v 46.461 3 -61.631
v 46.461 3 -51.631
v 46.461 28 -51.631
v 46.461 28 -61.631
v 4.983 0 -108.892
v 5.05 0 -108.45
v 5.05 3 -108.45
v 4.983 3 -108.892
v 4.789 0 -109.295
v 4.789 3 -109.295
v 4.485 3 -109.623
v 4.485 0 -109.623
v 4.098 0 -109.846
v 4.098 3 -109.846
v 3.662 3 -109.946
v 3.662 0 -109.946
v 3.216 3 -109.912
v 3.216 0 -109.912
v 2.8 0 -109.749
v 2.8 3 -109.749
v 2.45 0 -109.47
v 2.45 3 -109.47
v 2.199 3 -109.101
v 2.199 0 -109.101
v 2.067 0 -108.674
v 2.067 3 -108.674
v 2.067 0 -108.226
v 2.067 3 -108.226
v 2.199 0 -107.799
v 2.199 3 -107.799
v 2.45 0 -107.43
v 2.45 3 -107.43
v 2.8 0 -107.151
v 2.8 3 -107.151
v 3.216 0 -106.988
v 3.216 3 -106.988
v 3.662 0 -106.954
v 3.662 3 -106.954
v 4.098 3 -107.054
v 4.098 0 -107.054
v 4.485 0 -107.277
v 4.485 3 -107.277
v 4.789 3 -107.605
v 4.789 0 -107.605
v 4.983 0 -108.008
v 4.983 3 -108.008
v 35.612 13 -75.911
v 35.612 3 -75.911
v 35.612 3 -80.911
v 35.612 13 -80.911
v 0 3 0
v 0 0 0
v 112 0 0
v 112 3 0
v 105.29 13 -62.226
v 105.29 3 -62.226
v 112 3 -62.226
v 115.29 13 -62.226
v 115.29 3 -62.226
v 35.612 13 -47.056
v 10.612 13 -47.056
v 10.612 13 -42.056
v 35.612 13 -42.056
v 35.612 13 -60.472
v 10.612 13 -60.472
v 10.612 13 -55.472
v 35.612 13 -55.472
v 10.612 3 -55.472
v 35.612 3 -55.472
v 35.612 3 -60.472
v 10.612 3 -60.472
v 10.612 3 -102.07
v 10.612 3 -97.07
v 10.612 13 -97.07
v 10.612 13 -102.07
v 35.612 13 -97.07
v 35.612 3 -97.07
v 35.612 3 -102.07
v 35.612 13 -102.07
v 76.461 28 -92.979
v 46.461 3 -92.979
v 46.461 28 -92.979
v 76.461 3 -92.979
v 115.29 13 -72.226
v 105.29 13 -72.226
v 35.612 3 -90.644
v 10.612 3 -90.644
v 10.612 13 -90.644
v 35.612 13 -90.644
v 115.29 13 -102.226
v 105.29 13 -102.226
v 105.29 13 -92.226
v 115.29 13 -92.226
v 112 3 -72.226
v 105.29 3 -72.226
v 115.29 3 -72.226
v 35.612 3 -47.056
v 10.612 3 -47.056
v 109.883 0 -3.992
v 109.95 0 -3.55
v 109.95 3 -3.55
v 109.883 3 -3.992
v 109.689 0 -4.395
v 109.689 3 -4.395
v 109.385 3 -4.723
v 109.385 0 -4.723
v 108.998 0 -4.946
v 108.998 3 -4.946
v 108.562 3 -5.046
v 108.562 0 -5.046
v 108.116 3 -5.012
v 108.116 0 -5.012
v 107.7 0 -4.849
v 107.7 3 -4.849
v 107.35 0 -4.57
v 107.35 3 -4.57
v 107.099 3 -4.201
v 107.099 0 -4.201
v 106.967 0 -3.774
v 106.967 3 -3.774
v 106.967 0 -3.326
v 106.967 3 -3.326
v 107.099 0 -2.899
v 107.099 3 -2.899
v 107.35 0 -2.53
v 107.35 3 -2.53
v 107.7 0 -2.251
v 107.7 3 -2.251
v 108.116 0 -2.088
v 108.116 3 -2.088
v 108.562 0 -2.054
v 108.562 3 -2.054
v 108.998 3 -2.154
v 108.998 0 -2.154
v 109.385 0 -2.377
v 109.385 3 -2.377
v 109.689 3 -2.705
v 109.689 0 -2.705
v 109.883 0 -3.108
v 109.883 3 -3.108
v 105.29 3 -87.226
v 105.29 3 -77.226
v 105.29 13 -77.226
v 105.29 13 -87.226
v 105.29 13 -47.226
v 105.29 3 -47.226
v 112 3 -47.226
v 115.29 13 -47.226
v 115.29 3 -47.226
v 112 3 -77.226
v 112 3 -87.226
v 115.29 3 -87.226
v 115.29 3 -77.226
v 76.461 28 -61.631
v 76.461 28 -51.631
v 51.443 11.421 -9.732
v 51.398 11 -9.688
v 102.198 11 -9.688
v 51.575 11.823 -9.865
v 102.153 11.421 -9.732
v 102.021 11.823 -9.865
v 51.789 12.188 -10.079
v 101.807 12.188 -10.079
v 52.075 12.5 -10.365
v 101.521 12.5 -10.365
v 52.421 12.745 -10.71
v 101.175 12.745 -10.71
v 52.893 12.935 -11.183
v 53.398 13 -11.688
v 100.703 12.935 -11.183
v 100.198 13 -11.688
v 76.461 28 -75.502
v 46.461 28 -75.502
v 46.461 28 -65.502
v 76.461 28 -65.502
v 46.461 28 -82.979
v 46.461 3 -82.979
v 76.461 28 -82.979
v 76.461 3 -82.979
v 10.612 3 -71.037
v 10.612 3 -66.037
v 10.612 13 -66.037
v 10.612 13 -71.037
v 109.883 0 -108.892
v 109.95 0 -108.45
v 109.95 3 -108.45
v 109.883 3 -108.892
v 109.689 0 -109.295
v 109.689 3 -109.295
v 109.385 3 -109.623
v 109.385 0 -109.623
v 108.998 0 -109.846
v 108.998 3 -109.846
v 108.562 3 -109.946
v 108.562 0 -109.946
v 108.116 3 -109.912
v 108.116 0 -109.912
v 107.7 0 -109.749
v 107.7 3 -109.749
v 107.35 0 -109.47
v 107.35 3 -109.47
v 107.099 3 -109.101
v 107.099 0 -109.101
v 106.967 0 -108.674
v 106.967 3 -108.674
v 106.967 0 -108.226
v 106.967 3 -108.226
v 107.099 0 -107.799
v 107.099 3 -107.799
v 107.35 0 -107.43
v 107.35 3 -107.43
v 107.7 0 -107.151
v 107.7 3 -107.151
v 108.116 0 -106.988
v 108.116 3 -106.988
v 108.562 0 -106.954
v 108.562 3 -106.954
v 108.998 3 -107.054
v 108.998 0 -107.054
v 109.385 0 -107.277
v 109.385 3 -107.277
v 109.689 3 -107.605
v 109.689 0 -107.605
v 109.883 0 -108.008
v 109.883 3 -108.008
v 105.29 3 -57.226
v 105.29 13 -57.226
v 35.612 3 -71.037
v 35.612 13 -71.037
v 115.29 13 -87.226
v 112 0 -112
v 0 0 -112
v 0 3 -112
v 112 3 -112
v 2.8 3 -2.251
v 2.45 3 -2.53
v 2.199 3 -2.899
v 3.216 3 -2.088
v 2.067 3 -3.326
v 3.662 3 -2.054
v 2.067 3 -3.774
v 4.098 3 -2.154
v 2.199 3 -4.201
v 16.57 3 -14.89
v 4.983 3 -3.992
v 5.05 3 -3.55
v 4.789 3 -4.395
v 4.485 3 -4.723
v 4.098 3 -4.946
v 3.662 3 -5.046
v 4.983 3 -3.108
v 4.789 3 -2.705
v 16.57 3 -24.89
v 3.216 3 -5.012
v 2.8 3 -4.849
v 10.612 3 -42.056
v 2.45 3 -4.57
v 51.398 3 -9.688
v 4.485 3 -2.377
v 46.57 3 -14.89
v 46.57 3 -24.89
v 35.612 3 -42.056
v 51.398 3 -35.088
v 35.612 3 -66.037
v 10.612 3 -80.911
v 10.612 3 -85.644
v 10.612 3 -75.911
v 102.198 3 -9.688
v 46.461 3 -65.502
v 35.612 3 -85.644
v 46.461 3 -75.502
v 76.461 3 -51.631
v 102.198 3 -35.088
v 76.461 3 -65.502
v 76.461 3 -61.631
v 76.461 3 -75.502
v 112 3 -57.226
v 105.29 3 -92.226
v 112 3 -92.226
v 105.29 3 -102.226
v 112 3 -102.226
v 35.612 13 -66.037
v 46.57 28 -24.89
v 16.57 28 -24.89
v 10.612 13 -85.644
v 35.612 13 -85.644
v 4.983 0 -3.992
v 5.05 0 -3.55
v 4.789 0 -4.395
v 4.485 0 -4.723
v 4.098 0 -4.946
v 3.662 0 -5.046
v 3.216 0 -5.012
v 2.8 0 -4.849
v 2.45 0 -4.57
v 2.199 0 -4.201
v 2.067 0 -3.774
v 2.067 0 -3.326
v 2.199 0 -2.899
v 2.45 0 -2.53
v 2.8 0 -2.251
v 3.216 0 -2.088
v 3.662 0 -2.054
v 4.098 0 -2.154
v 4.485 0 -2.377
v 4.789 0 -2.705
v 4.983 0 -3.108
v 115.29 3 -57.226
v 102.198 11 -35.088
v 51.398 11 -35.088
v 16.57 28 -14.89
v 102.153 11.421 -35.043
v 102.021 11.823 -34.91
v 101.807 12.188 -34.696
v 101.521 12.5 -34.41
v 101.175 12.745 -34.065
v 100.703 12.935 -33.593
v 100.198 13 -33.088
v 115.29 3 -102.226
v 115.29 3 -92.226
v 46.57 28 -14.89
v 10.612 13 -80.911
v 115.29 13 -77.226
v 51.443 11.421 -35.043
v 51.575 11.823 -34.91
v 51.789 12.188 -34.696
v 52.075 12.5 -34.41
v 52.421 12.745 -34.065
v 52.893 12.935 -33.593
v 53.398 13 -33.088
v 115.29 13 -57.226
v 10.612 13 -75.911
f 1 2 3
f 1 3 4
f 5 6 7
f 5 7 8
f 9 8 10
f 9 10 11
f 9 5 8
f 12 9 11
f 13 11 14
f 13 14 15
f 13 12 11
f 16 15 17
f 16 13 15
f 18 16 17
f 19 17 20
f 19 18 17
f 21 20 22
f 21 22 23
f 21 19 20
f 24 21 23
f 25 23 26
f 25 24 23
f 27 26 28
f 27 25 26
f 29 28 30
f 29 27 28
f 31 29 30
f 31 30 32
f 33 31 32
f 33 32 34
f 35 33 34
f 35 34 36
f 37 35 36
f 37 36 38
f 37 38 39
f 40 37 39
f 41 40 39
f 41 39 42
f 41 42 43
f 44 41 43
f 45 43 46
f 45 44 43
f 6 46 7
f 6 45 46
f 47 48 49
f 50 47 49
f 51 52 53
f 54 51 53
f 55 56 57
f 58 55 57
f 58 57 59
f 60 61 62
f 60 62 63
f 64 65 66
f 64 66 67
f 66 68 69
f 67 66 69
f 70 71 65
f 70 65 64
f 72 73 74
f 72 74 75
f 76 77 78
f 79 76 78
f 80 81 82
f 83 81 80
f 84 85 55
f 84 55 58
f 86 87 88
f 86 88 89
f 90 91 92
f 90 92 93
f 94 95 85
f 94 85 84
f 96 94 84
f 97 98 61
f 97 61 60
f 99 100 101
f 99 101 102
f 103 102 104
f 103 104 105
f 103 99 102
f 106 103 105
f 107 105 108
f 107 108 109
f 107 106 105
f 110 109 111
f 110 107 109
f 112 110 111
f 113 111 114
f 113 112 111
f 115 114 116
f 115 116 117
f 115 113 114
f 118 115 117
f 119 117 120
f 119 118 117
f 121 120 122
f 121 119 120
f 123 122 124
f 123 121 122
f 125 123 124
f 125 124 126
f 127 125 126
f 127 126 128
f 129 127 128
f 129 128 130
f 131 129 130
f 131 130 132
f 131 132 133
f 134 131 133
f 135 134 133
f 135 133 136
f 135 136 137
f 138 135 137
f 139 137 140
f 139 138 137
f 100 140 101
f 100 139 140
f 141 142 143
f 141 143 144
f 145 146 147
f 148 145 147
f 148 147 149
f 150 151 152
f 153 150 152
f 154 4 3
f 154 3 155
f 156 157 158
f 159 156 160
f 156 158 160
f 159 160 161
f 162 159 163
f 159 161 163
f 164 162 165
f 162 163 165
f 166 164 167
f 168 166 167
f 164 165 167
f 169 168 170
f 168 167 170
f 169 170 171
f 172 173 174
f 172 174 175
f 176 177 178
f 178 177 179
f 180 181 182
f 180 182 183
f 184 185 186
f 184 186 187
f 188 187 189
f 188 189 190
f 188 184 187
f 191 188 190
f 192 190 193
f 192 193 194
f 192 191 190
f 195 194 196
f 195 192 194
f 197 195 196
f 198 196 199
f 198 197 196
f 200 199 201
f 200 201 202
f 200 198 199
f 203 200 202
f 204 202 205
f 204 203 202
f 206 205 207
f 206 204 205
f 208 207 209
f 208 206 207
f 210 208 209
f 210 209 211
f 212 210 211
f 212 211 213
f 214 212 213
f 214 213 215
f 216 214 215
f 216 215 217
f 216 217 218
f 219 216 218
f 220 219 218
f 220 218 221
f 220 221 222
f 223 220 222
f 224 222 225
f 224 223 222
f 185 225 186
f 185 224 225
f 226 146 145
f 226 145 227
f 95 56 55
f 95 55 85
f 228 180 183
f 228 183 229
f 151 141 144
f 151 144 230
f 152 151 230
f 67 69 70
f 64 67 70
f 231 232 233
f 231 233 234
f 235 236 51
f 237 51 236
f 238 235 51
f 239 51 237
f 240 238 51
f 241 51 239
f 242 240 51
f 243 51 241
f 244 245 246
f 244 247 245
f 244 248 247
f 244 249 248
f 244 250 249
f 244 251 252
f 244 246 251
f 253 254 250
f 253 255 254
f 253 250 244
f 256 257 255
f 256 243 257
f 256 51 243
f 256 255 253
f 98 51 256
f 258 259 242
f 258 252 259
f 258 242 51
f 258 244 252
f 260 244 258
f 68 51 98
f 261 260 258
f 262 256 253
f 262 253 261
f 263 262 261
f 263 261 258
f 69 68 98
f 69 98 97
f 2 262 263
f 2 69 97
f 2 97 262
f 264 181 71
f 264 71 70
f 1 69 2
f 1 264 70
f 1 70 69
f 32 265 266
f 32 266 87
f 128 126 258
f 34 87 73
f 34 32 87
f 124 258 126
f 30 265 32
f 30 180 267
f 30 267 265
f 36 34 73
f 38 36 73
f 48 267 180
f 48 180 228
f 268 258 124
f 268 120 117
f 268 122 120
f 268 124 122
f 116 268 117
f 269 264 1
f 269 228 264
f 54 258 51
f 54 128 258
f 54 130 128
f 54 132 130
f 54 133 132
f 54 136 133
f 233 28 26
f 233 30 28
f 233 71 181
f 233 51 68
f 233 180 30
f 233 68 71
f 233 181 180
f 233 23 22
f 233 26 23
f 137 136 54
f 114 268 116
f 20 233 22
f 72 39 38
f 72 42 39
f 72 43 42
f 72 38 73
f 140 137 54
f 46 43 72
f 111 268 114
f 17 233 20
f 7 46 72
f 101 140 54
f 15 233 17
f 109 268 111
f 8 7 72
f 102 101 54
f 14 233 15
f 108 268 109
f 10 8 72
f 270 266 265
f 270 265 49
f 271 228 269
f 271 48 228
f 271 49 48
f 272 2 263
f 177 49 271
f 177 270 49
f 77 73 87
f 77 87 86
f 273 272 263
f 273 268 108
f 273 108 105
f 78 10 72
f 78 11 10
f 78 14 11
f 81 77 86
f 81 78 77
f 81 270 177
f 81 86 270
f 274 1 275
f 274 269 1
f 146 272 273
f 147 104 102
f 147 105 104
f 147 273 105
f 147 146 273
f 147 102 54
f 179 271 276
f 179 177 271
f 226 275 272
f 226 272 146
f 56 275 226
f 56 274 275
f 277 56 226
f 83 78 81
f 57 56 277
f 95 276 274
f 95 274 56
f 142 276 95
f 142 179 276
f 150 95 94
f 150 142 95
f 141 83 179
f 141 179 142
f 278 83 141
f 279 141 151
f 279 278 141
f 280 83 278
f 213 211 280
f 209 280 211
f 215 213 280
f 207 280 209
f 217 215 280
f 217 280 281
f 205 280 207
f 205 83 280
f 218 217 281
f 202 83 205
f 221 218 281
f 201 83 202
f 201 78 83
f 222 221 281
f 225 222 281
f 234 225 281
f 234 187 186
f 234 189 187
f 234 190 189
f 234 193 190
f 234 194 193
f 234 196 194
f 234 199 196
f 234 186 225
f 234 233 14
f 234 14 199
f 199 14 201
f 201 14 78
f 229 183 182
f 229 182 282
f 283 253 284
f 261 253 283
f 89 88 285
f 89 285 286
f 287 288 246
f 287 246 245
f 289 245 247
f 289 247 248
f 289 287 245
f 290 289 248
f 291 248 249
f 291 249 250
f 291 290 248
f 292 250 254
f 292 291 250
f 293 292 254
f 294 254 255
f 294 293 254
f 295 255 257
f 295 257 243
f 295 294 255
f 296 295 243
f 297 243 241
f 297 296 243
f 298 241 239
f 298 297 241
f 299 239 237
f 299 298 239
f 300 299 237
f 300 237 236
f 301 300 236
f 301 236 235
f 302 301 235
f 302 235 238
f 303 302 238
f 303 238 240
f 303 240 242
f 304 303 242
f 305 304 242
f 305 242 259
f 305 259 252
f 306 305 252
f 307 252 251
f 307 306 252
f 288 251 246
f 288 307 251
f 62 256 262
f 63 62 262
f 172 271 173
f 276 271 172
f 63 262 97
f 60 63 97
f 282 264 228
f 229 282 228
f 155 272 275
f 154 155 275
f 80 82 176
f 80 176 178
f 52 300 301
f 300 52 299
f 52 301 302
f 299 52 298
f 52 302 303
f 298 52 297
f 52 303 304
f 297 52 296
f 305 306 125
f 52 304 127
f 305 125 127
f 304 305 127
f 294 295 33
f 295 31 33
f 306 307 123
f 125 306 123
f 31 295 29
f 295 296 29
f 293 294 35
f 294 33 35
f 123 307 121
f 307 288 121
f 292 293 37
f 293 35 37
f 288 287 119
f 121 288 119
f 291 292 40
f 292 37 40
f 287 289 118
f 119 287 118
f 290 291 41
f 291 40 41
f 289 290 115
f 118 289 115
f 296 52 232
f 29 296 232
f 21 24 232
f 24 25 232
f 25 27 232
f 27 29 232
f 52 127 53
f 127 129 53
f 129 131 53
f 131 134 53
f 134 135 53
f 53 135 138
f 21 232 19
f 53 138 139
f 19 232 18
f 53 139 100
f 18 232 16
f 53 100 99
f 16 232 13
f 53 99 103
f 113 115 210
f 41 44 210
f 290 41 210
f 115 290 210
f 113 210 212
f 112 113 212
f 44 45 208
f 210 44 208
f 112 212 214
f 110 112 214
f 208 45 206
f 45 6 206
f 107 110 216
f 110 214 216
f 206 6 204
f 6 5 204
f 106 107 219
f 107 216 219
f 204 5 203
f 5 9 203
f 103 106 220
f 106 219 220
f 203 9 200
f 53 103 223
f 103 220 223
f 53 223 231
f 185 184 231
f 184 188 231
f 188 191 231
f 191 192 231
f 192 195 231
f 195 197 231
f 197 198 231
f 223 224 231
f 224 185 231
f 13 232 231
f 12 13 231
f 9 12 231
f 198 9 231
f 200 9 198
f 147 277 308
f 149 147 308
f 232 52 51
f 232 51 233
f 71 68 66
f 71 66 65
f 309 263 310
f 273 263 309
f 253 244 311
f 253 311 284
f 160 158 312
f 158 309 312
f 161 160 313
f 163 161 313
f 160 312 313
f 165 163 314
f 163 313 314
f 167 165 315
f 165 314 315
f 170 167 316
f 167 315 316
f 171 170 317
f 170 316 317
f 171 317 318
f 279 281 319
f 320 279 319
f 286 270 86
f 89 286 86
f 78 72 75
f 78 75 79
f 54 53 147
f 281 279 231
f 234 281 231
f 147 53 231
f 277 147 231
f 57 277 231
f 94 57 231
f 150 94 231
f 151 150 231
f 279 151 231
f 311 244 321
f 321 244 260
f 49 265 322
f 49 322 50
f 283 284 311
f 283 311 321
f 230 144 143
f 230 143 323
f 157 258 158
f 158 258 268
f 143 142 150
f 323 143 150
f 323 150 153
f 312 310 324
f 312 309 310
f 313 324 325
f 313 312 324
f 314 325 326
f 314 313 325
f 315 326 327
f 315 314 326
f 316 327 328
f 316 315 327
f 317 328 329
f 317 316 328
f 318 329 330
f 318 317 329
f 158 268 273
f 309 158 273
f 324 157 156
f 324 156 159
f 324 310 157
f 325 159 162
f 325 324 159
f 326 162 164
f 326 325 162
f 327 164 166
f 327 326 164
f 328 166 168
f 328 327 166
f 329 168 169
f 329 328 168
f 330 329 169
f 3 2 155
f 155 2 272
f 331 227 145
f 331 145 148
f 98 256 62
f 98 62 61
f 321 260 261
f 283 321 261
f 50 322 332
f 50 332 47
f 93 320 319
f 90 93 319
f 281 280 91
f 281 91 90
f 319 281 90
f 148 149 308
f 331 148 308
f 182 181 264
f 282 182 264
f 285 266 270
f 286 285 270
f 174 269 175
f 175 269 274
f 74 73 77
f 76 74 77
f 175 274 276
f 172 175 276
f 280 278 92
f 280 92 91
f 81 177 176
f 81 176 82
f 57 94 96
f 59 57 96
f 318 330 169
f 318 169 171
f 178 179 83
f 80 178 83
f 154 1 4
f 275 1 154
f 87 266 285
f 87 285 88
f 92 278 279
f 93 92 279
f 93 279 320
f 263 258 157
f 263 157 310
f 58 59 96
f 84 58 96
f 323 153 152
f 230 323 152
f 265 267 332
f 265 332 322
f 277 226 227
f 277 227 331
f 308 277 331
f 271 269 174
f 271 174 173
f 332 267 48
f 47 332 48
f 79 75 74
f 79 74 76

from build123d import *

# Parameters (mm, degrees)
ESQUISSE1_W      = 112
ESQUISSE1_H      = 112
ESQUISSE1_R      = 1.5
EXTRUSION1_DEPTH = 3
ESQUISSE2_W      = 50.8
ESQUISSE2_H      = 25.4
EXTRUSION2_DEPTH = 10
CONG_1_R         = 2
ESQUISSE3_W      = 10
ESQUISSE3_H      = 10
EXTRUSION3_DEPTH = 10
ESQUISSE4_W      = 30
ESQUISSE4_H      = 10
EXTRUSION4_DEPTH = 25
ESQUISSE6_W      = 25
ESQUISSE6_H      = 5
EXTRUSION6_DEPTH = 10


with BuildPart() as part:
    # Esquisse1 → Extrusion1 (new body)
    with BuildSketch(Plane(origin=(0, 0, 0), x_dir=(1, 0, 0), z_dir=(0, 1, 0))):
        with Locations((56, 56)):
            Rectangle(ESQUISSE1_W, ESQUISSE1_H)
        with Locations((3.55, 108.45)):
            Circle(ESQUISSE1_R, mode=Mode.SUBTRACT)
        with Locations((108.45, 108.45)):
            Circle(ESQUISSE1_R, mode=Mode.SUBTRACT)
        with Locations((108.45, 3.55)):
            Circle(ESQUISSE1_R, mode=Mode.SUBTRACT)
        with Locations((3.55, 3.55)):
            Circle(ESQUISSE1_R, mode=Mode.SUBTRACT)
    extrude(amount=EXTRUSION1_DEPTH)

    # Esquisse2 → Extrusion2 (add)
    with BuildSketch(Plane(origin=(0, 3, 0), x_dir=(1, 0, 0), z_dir=(0, 1, 0))):
        with Locations((76.797974596, 22.38755788)):
            Rectangle(ESQUISSE2_W, ESQUISSE2_H)
    extrude(amount=EXTRUSION2_DEPTH)

    # Congé1
    cong_1_edges = [part.edges().sort_by_distance(p)[0] for p in [
        (51.397974596, 13, -22.38755788),
        (76.797974596, 13, -9.68755788),
        (102.197974596, 13, -22.38755788),
        (76.797974596, 13, -35.08755788),
    ]]
    fillet(cong_1_edges, radius=CONG_1_R)

    # Esquisse3 → Extrusion3 (add)
    with BuildSketch(Plane(origin=(0, 3, 0), x_dir=(1, 0, 0), z_dir=(0, 1, 0))):
        with Locations((110.289997157, 97.226447648)):
            Rectangle(ESQUISSE3_W, ESQUISSE3_H)
        with Locations((110.289997157, 67.226447648)):
            Rectangle(ESQUISSE3_W, ESQUISSE3_H)
        with Locations((110.289997157, 52.226447648)):
            Rectangle(ESQUISSE3_W, ESQUISSE3_H)
        with Locations((110.289997157, 82.226447648)):
            Rectangle(ESQUISSE3_W, ESQUISSE3_H)
    extrude(amount=EXTRUSION3_DEPTH)

    # Esquisse4 → Extrusion4 (add)
    with BuildSketch(Plane(origin=(0, 3, 0), x_dir=(1, 0, 0), z_dir=(0, 1, 0))):
        with Locations((61.461032567, 56.630717004)):
            Rectangle(ESQUISSE4_W, ESQUISSE4_H)
        with Locations((61.461032567, 70.501921666)):
            Rectangle(ESQUISSE4_W, ESQUISSE4_H)
        with Locations((31.569885157, 19.889690111)):
            Rectangle(ESQUISSE4_W, ESQUISSE4_H)
        with Locations((61.461032567, 87.97905365)):
            Rectangle(ESQUISSE4_W, ESQUISSE4_H)
    extrude(amount=EXTRUSION4_DEPTH)

    # Esquisse6 → Extrusion6 (add)
    with BuildSketch(Plane(origin=(0, 3, 0), x_dir=(1, 0, 0), z_dir=(0, 1, 0))):
        with Locations((23.111824989, 78.410936793)):
            Rectangle(ESQUISSE6_W, ESQUISSE6_H)
        with Locations((23.111824989, 57.971644922)):
            Rectangle(ESQUISSE6_W, ESQUISSE6_H)
        with Locations((23.111824989, 68.536691251)):
            Rectangle(ESQUISSE6_W, ESQUISSE6_H)
        with Locations((23.111824989, 44.556380649)):
            Rectangle(ESQUISSE6_W, ESQUISSE6_H)
        with Locations((23.111824989, 88.144121685)):
            Rectangle(ESQUISSE6_W, ESQUISSE6_H)
        with Locations((23.111824989, 99.570034384)):
            Rectangle(ESQUISSE6_W, ESQUISSE6_H)
    extrude(amount=EXTRUSION6_DEPTH)


solid = part.part
